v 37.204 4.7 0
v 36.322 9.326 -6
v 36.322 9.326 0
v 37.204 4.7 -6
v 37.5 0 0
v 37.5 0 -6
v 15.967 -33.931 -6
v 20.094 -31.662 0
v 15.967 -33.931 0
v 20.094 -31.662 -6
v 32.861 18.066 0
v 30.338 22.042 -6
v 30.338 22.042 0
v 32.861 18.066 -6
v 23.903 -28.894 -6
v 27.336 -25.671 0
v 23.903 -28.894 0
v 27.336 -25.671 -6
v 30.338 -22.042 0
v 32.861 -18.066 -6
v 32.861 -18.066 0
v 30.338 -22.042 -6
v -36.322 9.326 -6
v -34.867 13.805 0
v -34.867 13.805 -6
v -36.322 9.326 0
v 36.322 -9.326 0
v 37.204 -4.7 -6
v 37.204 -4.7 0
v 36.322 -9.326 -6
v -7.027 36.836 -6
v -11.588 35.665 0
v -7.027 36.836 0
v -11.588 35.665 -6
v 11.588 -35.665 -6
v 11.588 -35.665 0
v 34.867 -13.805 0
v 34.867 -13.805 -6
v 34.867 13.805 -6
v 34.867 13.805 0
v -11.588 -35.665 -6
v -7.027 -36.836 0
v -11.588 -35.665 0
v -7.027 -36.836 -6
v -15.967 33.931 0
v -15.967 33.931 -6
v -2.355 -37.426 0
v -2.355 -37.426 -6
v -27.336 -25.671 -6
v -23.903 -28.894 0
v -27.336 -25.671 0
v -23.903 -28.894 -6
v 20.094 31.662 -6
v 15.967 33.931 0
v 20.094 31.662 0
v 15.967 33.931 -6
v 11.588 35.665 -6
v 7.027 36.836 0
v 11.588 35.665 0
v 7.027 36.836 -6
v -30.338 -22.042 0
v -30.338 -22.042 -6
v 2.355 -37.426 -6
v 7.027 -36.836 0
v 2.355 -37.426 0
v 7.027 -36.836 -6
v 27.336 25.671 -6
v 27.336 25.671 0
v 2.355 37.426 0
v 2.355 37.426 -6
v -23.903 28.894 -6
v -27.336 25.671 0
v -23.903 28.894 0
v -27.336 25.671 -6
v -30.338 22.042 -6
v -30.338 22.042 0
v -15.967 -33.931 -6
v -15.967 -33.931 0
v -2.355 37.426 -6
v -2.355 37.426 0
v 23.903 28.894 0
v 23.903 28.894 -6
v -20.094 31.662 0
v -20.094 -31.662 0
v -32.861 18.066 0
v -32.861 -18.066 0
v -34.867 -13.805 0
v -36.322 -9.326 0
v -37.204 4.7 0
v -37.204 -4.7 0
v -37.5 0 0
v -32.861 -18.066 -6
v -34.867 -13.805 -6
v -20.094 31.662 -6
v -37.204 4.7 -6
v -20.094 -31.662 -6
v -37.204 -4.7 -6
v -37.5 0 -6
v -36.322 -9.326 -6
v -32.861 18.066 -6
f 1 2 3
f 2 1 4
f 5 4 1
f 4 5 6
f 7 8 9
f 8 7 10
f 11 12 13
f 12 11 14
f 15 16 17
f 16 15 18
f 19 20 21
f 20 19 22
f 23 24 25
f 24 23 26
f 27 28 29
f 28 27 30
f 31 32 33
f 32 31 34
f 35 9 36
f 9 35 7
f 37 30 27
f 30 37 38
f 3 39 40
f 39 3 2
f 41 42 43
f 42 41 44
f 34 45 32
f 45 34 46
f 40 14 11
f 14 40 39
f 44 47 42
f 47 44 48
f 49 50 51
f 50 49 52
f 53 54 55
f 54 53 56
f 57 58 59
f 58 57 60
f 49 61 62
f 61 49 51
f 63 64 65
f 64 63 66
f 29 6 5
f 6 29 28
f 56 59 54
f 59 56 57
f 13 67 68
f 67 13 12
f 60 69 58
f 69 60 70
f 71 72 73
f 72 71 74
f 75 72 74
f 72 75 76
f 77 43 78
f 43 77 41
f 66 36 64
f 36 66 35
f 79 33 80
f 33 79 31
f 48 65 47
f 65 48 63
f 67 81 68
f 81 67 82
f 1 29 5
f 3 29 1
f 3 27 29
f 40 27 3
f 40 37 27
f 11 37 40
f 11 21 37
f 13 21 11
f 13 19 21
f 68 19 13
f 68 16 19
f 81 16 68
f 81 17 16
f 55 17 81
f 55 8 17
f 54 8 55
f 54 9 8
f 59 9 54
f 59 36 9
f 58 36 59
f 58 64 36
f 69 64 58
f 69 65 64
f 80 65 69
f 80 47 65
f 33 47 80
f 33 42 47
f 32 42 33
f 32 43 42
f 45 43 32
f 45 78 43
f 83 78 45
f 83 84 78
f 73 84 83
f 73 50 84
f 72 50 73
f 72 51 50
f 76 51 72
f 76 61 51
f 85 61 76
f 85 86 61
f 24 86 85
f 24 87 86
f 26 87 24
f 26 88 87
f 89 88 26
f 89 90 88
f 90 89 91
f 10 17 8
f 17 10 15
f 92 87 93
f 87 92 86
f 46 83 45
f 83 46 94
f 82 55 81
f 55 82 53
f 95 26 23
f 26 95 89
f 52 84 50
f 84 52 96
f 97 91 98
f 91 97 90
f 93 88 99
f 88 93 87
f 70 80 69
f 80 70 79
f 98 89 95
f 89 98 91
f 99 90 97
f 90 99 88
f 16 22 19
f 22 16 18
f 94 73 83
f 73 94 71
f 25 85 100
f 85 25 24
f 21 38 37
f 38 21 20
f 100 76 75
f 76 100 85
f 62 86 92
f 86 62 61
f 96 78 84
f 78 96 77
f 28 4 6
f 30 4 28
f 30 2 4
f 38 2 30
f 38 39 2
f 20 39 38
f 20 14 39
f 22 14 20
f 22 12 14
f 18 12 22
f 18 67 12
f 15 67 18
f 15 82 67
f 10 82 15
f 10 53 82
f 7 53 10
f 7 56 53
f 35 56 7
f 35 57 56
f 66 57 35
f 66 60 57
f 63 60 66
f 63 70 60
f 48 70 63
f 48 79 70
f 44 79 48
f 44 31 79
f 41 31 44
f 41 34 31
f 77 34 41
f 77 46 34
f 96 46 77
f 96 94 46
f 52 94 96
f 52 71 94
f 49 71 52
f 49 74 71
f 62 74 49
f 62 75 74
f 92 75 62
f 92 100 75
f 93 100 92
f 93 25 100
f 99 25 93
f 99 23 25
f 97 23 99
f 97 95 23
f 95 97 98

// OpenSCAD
$fn = 50;


difference() {
	union() {
		cylinder(h = 0, r = 12.5000000000);
		translate(v = [0, 0, -6.0000000000]) {
			cylinder(h = 6, r = 37.5000000000);
		}
	}
	union() {
		#translate(v = [8.0000000000, 0.0000000000, 0]) {
			cylinder(h = 0, r = 3.2500000000);
		}
		#translate(v = [-4.0000000000, 6.9282032303, 0]) {
			cylinder(h = 0, r = 3.2500000000);
		}
		#translate(v = [-4.0000000000, -6.9282032303, 0]) {
			cylinder(h = 0, r = 3.2500000000);
		}
	}
}
